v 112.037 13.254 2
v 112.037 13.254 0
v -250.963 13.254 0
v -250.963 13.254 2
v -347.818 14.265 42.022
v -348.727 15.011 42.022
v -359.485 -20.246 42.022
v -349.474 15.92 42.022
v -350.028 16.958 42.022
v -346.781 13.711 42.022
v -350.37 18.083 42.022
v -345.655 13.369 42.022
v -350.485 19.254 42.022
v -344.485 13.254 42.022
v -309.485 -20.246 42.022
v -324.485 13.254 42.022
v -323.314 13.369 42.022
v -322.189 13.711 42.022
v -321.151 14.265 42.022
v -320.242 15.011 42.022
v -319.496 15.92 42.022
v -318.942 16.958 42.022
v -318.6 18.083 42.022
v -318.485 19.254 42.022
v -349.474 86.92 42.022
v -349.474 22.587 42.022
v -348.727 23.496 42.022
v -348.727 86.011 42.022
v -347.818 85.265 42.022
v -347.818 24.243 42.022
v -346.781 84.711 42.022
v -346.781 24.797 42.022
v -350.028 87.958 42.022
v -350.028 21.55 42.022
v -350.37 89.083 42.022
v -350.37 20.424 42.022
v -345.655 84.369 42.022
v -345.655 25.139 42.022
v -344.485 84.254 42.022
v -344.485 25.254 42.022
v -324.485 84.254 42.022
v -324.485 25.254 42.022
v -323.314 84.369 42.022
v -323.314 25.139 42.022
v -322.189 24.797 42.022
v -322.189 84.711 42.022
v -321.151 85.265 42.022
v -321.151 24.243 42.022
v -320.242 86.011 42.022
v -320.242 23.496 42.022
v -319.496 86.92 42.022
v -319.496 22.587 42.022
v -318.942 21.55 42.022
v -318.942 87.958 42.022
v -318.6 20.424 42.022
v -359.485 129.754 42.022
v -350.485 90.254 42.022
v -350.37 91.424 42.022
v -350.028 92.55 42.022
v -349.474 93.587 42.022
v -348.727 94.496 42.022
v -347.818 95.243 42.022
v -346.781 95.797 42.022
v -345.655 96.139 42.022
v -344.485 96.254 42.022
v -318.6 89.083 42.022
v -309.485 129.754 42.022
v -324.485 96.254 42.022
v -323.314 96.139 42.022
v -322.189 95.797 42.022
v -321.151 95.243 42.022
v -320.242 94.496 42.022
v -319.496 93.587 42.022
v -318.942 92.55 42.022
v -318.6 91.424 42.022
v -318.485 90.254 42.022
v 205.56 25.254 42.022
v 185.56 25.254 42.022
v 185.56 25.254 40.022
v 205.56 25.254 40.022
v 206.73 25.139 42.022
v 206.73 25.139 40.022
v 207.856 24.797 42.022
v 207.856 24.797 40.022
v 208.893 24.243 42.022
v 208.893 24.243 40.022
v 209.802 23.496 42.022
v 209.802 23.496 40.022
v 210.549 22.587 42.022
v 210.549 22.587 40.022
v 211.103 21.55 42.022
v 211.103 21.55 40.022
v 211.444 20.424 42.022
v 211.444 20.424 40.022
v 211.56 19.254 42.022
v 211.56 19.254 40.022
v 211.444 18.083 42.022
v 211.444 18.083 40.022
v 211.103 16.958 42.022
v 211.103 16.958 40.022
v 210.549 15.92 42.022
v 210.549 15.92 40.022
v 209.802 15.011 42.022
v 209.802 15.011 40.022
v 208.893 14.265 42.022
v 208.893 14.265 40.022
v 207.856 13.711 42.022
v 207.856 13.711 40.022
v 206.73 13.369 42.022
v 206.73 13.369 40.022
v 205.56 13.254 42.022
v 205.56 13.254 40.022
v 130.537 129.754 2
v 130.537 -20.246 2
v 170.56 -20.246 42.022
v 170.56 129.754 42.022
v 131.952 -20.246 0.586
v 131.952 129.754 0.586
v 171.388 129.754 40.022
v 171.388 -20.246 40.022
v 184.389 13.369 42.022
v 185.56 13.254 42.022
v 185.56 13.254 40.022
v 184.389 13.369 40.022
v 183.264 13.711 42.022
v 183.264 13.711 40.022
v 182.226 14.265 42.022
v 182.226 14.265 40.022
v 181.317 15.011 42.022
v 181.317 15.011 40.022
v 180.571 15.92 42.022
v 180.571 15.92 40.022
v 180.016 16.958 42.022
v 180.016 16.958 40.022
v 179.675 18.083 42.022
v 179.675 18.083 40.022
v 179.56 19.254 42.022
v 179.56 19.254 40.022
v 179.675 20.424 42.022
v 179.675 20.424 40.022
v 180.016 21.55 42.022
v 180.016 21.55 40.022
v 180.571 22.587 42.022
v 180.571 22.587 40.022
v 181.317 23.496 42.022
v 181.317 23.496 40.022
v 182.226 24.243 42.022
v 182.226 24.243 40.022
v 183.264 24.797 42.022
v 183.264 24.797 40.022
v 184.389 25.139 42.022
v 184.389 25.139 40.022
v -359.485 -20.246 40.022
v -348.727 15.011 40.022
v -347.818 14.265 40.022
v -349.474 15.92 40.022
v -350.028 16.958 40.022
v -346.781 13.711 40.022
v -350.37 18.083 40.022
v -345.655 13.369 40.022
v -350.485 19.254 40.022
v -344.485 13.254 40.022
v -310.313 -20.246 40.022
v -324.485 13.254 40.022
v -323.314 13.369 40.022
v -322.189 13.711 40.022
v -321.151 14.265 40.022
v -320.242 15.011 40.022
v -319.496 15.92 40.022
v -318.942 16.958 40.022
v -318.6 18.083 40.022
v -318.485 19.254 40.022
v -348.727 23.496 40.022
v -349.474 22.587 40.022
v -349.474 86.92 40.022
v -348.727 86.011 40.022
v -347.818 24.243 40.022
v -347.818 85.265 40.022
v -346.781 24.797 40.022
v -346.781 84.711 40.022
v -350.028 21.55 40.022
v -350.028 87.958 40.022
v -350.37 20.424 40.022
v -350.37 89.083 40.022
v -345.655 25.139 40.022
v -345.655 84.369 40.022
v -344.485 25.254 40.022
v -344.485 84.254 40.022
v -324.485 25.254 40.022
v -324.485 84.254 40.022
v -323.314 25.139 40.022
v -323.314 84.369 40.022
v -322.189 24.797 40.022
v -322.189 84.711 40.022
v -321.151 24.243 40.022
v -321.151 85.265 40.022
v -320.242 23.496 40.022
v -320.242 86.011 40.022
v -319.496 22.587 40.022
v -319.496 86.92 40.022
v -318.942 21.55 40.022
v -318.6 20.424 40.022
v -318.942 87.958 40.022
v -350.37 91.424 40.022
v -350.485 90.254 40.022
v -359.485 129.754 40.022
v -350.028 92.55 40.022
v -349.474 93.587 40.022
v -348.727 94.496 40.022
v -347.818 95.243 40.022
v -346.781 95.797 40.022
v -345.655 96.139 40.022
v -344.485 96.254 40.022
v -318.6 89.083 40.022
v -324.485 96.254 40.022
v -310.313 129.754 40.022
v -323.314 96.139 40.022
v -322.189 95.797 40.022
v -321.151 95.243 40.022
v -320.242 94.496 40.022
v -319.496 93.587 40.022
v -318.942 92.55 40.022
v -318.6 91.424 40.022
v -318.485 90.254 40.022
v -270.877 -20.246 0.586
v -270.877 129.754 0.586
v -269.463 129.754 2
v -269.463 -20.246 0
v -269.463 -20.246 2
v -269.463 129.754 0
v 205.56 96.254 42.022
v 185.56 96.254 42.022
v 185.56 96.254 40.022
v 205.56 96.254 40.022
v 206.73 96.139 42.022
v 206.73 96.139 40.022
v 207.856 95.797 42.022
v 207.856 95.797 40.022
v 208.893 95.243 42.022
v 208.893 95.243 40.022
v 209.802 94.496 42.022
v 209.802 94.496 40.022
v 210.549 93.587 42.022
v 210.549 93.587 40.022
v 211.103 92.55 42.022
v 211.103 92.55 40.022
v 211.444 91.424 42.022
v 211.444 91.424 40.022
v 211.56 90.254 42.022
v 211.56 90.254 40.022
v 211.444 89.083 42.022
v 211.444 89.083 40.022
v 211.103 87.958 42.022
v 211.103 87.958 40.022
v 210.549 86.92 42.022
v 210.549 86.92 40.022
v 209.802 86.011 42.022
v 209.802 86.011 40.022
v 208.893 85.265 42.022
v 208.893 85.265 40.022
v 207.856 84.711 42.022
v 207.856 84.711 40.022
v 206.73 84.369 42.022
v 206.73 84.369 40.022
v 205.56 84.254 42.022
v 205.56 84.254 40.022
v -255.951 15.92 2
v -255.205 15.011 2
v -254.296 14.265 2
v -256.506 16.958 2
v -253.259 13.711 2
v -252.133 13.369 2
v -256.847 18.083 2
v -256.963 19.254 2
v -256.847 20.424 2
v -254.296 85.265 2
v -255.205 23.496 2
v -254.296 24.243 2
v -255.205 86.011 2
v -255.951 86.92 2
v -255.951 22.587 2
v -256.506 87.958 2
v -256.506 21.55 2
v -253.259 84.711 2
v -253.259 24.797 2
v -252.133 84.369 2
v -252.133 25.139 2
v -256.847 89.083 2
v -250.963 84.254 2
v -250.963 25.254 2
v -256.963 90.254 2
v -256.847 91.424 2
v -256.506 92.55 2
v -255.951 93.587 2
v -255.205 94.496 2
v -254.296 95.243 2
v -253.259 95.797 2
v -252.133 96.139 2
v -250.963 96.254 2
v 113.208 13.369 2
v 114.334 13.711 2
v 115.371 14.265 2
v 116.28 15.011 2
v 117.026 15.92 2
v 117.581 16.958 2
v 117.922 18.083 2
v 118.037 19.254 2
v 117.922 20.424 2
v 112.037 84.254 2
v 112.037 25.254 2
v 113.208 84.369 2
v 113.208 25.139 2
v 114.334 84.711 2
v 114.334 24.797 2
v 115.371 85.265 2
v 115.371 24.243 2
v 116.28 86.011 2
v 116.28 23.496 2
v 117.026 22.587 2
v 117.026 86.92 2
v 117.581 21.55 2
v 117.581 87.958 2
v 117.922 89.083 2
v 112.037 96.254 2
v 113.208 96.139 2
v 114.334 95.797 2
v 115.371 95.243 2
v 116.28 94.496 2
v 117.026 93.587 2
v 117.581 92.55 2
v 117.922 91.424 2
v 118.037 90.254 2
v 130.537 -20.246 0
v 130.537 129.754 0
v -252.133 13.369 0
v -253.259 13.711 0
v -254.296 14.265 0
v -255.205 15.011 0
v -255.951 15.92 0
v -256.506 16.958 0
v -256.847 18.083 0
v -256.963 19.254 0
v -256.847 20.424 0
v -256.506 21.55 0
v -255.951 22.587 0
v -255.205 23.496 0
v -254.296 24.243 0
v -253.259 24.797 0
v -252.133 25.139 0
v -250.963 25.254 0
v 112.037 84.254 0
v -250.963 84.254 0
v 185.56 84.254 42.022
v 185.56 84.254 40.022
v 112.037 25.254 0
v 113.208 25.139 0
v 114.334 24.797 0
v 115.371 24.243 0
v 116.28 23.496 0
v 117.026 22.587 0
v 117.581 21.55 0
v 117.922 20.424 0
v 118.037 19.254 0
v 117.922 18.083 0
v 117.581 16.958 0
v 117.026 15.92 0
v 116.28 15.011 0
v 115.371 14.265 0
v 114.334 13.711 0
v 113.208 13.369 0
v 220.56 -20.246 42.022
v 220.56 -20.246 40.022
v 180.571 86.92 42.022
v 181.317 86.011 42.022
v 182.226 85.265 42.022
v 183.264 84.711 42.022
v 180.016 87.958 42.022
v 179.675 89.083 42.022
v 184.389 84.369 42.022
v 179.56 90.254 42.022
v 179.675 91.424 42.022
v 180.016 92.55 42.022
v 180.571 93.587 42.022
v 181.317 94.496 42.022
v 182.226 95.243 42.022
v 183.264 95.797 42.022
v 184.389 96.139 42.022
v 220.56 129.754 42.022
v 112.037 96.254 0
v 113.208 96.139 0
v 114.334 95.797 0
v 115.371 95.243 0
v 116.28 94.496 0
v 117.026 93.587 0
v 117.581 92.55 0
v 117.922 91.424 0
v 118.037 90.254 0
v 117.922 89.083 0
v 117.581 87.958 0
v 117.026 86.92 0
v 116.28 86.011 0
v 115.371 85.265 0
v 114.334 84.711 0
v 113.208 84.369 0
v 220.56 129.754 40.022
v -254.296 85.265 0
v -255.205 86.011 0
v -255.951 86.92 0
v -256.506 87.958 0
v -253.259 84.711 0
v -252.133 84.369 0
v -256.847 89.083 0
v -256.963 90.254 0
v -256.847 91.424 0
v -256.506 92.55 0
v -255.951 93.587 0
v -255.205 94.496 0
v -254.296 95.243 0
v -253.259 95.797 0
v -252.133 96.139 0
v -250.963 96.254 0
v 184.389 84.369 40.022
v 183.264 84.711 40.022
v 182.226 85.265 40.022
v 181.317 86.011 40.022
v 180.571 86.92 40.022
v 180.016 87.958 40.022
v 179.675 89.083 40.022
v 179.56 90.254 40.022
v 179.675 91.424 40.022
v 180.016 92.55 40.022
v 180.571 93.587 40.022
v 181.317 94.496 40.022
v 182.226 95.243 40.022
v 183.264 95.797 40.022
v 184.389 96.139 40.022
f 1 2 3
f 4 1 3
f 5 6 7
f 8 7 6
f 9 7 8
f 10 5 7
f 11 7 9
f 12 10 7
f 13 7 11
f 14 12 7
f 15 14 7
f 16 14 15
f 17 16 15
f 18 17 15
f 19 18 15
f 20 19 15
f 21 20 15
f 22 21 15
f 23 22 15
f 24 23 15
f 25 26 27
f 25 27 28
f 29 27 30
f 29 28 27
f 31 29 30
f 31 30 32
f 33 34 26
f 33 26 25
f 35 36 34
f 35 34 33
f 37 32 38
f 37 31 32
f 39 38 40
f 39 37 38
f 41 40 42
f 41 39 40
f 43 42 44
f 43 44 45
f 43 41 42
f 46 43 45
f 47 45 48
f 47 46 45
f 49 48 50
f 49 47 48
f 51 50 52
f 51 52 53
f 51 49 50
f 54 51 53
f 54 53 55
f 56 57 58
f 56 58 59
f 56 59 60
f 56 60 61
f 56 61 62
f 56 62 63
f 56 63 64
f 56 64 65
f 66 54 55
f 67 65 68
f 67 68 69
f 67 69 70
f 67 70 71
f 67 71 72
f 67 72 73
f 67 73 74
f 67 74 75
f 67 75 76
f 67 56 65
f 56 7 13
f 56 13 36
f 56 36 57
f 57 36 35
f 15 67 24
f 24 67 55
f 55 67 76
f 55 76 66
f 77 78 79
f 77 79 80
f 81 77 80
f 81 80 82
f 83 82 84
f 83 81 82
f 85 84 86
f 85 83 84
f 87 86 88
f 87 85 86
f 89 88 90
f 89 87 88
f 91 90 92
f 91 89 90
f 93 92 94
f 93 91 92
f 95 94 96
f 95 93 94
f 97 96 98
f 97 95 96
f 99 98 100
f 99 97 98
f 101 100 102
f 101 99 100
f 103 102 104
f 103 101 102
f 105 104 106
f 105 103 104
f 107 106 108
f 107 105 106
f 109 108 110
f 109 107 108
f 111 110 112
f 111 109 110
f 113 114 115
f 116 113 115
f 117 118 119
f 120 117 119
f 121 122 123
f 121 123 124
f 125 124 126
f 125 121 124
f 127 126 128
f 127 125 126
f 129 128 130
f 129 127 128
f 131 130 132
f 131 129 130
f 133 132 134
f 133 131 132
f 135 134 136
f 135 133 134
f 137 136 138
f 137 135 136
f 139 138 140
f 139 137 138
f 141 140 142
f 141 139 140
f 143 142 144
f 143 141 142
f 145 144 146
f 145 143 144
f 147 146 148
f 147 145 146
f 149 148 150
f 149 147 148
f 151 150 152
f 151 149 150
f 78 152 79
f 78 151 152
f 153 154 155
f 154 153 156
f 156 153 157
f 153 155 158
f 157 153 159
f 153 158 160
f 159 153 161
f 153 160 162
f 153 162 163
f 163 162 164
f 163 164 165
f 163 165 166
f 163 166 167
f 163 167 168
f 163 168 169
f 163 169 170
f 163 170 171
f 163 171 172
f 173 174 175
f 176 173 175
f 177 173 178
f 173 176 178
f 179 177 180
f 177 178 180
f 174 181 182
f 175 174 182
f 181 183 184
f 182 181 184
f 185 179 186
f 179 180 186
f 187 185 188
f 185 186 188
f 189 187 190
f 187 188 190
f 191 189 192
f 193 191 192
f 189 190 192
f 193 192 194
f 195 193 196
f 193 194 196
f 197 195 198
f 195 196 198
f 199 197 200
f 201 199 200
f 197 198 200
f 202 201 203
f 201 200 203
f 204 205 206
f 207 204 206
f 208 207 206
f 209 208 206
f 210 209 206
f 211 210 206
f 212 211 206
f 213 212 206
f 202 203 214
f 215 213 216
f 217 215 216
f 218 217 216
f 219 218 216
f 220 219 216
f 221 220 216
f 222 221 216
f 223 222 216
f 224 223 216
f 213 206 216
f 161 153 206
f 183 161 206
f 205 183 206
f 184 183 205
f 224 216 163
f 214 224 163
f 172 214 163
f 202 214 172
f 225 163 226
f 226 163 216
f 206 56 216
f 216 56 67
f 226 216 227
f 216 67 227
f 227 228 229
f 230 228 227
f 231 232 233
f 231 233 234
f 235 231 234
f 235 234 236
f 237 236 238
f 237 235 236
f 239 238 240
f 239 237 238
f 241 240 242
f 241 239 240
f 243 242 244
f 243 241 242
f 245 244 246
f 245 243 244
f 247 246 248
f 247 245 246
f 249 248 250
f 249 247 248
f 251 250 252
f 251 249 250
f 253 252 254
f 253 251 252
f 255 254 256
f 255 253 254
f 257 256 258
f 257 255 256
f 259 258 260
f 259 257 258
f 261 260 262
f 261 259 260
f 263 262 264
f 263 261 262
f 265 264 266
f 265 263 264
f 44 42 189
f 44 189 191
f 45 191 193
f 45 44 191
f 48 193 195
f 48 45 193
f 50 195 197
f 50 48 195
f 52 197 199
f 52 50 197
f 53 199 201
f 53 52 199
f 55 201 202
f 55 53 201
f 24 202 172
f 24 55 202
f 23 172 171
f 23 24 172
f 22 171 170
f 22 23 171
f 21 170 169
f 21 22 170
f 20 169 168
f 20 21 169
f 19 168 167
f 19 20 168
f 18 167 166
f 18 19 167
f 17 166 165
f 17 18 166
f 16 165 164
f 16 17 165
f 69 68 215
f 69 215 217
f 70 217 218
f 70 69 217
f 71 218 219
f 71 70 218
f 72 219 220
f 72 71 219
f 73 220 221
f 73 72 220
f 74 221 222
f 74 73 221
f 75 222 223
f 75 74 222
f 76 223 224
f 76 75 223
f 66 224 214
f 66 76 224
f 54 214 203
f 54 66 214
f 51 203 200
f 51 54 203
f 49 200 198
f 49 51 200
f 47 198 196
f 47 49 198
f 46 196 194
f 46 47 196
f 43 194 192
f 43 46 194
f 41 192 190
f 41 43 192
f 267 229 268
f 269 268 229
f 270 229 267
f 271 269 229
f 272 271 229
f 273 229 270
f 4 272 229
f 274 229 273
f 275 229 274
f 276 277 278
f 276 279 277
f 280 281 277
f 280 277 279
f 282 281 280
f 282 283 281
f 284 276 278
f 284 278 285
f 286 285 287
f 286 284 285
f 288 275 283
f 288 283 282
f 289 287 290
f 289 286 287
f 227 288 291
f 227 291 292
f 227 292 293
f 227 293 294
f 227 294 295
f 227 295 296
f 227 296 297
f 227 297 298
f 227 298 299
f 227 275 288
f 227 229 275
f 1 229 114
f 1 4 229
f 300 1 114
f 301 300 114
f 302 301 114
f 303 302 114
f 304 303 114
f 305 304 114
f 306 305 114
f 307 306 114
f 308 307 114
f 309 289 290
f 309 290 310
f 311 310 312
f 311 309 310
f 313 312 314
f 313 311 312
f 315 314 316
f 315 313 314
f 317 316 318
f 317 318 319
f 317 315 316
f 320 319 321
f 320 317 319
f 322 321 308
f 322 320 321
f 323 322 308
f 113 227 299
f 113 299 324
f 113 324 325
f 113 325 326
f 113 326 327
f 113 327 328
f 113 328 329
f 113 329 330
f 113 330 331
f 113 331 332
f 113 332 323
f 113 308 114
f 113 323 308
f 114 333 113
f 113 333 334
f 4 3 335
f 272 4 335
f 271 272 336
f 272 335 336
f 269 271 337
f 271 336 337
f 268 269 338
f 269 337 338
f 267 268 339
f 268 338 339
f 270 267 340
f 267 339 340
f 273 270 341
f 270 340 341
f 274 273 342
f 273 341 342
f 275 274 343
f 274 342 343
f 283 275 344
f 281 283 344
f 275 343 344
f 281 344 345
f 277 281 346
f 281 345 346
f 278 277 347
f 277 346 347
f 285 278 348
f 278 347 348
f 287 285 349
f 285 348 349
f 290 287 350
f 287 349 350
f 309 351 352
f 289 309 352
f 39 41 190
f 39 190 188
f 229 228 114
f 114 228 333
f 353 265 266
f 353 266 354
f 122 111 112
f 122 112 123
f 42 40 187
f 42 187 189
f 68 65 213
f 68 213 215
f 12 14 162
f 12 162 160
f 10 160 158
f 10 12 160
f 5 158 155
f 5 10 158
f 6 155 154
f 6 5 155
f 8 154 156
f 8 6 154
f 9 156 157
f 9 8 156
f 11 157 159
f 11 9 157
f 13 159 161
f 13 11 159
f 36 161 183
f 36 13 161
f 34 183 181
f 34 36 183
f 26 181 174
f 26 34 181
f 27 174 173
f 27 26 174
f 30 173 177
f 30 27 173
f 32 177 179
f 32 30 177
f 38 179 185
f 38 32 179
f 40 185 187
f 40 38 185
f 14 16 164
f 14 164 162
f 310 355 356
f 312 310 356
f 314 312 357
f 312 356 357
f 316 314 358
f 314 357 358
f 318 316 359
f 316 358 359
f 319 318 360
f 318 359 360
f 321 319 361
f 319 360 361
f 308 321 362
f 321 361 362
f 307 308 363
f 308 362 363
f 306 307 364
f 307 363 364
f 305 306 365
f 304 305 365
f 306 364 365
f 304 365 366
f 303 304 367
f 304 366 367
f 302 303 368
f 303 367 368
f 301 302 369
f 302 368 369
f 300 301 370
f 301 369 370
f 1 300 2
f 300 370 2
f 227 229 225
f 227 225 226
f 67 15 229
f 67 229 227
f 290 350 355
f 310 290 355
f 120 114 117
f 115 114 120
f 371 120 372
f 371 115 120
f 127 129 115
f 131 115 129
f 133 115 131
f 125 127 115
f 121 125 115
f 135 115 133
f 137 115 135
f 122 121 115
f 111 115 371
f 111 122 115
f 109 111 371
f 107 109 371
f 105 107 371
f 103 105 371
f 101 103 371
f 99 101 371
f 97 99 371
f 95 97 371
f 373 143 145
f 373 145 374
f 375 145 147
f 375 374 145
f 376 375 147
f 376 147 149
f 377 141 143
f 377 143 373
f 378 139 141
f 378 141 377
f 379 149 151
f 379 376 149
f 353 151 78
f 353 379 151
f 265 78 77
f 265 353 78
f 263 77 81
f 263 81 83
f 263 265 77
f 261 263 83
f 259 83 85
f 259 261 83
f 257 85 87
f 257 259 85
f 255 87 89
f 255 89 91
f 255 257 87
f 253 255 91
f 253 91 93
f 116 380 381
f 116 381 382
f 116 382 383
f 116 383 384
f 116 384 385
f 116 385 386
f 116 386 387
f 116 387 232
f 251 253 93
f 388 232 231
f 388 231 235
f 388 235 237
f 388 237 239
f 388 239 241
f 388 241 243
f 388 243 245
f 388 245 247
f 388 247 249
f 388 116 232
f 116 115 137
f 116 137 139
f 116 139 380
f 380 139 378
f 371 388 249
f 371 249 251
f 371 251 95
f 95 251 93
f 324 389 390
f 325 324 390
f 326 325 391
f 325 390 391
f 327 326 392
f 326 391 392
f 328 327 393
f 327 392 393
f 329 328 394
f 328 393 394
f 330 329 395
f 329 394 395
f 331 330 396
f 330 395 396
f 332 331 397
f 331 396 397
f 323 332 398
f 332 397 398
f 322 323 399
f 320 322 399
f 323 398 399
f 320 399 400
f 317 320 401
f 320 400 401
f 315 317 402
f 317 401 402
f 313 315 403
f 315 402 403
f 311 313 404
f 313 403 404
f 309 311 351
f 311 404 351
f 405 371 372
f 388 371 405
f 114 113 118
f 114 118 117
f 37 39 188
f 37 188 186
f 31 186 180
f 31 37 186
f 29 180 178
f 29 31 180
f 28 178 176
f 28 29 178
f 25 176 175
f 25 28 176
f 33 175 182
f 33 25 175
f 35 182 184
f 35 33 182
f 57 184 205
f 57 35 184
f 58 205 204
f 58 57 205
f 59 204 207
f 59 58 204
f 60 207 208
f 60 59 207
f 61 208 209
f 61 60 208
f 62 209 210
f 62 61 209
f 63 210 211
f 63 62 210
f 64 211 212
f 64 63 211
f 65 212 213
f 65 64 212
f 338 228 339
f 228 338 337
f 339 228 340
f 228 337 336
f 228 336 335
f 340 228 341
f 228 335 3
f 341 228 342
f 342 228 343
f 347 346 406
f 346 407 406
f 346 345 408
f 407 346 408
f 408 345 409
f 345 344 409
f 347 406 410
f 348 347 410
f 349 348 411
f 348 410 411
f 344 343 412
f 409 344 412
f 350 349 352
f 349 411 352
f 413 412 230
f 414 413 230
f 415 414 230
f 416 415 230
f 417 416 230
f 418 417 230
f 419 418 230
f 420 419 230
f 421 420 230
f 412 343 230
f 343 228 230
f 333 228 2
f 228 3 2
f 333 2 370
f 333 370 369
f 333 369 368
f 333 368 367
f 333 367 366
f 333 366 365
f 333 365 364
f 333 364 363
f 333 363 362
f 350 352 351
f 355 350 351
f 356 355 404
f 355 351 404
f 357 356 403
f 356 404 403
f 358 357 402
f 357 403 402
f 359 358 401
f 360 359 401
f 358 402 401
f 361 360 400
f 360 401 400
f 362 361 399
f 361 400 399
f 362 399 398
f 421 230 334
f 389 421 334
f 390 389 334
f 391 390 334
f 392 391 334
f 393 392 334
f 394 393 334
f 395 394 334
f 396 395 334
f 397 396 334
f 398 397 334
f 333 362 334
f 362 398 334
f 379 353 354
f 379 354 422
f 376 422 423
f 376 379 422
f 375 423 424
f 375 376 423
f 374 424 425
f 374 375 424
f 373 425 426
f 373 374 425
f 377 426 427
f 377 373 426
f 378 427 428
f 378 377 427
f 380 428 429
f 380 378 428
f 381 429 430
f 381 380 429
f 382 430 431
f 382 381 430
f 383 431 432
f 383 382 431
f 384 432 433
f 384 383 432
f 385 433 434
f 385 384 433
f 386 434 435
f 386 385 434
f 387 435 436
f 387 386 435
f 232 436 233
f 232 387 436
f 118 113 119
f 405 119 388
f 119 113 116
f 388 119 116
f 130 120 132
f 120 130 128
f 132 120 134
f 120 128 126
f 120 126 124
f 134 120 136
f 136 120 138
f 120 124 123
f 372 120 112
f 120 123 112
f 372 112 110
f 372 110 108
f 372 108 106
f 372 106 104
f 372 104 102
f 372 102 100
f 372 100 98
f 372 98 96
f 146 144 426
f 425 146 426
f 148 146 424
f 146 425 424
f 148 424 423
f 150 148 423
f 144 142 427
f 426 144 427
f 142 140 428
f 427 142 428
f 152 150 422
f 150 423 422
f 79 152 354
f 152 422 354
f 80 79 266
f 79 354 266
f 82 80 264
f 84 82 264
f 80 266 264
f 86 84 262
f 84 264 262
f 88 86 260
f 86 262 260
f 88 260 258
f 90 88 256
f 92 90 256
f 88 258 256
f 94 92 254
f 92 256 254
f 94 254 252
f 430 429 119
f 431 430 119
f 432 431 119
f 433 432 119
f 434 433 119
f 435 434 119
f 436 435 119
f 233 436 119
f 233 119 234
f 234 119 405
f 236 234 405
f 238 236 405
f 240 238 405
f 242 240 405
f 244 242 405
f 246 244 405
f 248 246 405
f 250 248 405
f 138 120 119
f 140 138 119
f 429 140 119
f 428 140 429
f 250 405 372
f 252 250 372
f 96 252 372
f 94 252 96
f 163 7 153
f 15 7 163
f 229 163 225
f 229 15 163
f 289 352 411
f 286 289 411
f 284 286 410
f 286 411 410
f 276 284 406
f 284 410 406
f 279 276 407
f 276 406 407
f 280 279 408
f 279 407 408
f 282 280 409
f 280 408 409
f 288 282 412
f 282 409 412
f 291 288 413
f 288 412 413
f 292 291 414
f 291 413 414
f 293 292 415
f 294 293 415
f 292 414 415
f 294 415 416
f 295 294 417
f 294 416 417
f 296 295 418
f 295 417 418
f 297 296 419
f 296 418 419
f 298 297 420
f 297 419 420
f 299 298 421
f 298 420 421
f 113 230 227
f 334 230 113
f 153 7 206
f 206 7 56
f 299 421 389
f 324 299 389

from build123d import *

# Parameters (mm, degrees)
F0_W      = 400
F0_H      = 150
F1_DEPTH  = 2
F3_W      = 56.6
F3_H      = 150
F4_DEPTH  = 2
F5_ANGLE  = 30
F8_W      = 150
F8_H      = 56.6
F9_DEPTH  = 2
F11_W     = 50
F11_H     = 150
F12_DEPTH = 2
F13_DEPTH = 2


with BuildPart() as f1:
    # F0 (on Top) → F1 (new body)
    with BuildSketch(Plane.XY):
        with Locations((-69.4625508785, 54.7538047686)):
            Rectangle(F0_W, F0_H)
        with BuildLine():
            Line((-250.9625508785, 25.2538047686), (112.0374491215, 25.2538047686))
            ThreePointArc((112.0374491215, 25.2538047686), (118.0374491215, 19.2538047686), (112.0374491215, 13.2538047686))
            Line((112.0374491215, 13.2538047686), (-250.9625508785, 13.2538047686))
            ThreePointArc((-250.9625508785, 13.2538047686), (-256.9625508785, 19.2538047686), (-250.9625508785, 25.2538047686))
        make_face(mode=Mode.SUBTRACT)
        with BuildLine():
            Line((-250.9625508785, 96.2538047686), (112.0374491215, 96.2538047686))
            ThreePointArc((112.0374491215, 96.2538047686), (118.0374491215, 90.2538047686), (112.0374491215, 84.2538047686))
            Line((112.0374491215, 84.2538047686), (-250.9625508785, 84.2538047686))
            ThreePointArc((-250.9625508785, 84.2538047686), (-256.9625508785, 90.2538047686), (-250.9625508785, 96.2538047686))
        make_face(mode=Mode.SUBTRACT)
    extrude(amount=F1_DEPTH)


with BuildPart() as f4:
    # F3 (on face) → F4 (new body)
    with BuildSketch(Plane(origin=(64.2687245607, 0, -64.2687245607), x_dir=(0.7071067812, 0, 0.7071067812), z_dir=(0.7071067812, 0, -0.7071067812))):
        with Locations((122.018129035, -54.7538047686)):
            Rectangle(F3_W, F3_H)
    extrude(amount=F4_DEPTH)


with BuildPart() as f5_1:
    # F5: copy of F4
    add(f4.part.rotate(Axis((-269.4625508785, 54.7538047686, 2), (0, -1, 0)), F5_ANGLE))


with BuildPart() as f9:
    # F8 (on face) → F9 (new body)
    with BuildSketch(Plane(origin=(-133.7312754393, 0, -133.7312754393), x_dir=(0, 1, 0), z_dir=(0.7071067812, 0, 0.7071067812))):
        with Locations((54.7538047686, 220.2530105644)):
            Rectangle(F8_W, F8_H)
    extrude(amount=-F9_DEPTH)

    # F11 (on 3pt) → F12 (join)
    with BuildSketch(Plane.XY.offset(42.0222438152)):
        with Locations((-334.4847946937, 54.7538047686)):
            Rectangle(F11_W, F11_H)
        with BuildLine():
            ThreePointArc((-324.4847946937, 25.2538047686), (-318.4847946937, 19.2538047686), (-324.4847946937, 13.2538047686))
            Line((-324.4847946937, 13.2538047686), (-344.4847946937, 13.2538047686))
            ThreePointArc((-344.4847946937, 13.2538047686), (-350.4847946937, 19.2538047686), (-344.4847946937, 25.2538047686))
            Line((-344.4847946937, 25.2538047686), (-324.4847946937, 25.2538047686))
        make_face(mode=Mode.SUBTRACT)
        with BuildLine():
            ThreePointArc((-324.4847946937, 96.2538047686), (-318.4847946937, 90.2538047686), (-324.4847946937, 84.2538047686))
            Line((-324.4847946937, 84.2538047686), (-344.4847946937, 84.2538047686))
            ThreePointArc((-344.4847946937, 84.2538047686), (-350.4847946937, 90.2538047686), (-344.4847946937, 96.2538047686))
            Line((-344.4847946937, 96.2538047686), (-324.4847946937, 96.2538047686))
        make_face(mode=Mode.SUBTRACT)
    extrude(amount=-F12_DEPTH)


with BuildPart() as f4_1:
    add(f4.part)

    # F11 (on 3pt) → F13 (join)
    with BuildSketch(Plane.XY.offset(42.0222438152)):
        with Locations((195.5596929366, 54.7538047686)):
            Rectangle(F11_W, F11_H)
        with BuildLine():
            ThreePointArc((205.5596929366, 25.2538047686), (211.5596929366, 19.2538047686), (205.5596929366, 13.2538047686))
            Line((205.5596929366, 13.2538047686), (185.5596929366, 13.2538047686))
            ThreePointArc((185.5596929366, 13.2538047686), (179.5596929366, 19.2538047686), (185.5596929366, 25.2538047686))
            Line((185.5596929366, 25.2538047686), (205.5596929366, 25.2538047686))
        make_face(mode=Mode.SUBTRACT)
        with BuildLine():
            ThreePointArc((205.5596929366, 96.2538047686), (211.5596929366, 90.2538047686), (205.5596929366, 84.2538047686))
            Line((205.5596929366, 84.2538047686), (185.5596929366, 84.2538047686))
            ThreePointArc((185.5596929366, 84.2538047686), (179.5596929366, 90.2538047686), (185.5596929366, 96.2538047686))
            Line((185.5596929366, 96.2538047686), (205.5596929366, 96.2538047686))
        make_face(mode=Mode.SUBTRACT)
    extrude(amount=-F13_DEPTH)


solid = Compound([f1.part, f9.part, f4_1.part])
